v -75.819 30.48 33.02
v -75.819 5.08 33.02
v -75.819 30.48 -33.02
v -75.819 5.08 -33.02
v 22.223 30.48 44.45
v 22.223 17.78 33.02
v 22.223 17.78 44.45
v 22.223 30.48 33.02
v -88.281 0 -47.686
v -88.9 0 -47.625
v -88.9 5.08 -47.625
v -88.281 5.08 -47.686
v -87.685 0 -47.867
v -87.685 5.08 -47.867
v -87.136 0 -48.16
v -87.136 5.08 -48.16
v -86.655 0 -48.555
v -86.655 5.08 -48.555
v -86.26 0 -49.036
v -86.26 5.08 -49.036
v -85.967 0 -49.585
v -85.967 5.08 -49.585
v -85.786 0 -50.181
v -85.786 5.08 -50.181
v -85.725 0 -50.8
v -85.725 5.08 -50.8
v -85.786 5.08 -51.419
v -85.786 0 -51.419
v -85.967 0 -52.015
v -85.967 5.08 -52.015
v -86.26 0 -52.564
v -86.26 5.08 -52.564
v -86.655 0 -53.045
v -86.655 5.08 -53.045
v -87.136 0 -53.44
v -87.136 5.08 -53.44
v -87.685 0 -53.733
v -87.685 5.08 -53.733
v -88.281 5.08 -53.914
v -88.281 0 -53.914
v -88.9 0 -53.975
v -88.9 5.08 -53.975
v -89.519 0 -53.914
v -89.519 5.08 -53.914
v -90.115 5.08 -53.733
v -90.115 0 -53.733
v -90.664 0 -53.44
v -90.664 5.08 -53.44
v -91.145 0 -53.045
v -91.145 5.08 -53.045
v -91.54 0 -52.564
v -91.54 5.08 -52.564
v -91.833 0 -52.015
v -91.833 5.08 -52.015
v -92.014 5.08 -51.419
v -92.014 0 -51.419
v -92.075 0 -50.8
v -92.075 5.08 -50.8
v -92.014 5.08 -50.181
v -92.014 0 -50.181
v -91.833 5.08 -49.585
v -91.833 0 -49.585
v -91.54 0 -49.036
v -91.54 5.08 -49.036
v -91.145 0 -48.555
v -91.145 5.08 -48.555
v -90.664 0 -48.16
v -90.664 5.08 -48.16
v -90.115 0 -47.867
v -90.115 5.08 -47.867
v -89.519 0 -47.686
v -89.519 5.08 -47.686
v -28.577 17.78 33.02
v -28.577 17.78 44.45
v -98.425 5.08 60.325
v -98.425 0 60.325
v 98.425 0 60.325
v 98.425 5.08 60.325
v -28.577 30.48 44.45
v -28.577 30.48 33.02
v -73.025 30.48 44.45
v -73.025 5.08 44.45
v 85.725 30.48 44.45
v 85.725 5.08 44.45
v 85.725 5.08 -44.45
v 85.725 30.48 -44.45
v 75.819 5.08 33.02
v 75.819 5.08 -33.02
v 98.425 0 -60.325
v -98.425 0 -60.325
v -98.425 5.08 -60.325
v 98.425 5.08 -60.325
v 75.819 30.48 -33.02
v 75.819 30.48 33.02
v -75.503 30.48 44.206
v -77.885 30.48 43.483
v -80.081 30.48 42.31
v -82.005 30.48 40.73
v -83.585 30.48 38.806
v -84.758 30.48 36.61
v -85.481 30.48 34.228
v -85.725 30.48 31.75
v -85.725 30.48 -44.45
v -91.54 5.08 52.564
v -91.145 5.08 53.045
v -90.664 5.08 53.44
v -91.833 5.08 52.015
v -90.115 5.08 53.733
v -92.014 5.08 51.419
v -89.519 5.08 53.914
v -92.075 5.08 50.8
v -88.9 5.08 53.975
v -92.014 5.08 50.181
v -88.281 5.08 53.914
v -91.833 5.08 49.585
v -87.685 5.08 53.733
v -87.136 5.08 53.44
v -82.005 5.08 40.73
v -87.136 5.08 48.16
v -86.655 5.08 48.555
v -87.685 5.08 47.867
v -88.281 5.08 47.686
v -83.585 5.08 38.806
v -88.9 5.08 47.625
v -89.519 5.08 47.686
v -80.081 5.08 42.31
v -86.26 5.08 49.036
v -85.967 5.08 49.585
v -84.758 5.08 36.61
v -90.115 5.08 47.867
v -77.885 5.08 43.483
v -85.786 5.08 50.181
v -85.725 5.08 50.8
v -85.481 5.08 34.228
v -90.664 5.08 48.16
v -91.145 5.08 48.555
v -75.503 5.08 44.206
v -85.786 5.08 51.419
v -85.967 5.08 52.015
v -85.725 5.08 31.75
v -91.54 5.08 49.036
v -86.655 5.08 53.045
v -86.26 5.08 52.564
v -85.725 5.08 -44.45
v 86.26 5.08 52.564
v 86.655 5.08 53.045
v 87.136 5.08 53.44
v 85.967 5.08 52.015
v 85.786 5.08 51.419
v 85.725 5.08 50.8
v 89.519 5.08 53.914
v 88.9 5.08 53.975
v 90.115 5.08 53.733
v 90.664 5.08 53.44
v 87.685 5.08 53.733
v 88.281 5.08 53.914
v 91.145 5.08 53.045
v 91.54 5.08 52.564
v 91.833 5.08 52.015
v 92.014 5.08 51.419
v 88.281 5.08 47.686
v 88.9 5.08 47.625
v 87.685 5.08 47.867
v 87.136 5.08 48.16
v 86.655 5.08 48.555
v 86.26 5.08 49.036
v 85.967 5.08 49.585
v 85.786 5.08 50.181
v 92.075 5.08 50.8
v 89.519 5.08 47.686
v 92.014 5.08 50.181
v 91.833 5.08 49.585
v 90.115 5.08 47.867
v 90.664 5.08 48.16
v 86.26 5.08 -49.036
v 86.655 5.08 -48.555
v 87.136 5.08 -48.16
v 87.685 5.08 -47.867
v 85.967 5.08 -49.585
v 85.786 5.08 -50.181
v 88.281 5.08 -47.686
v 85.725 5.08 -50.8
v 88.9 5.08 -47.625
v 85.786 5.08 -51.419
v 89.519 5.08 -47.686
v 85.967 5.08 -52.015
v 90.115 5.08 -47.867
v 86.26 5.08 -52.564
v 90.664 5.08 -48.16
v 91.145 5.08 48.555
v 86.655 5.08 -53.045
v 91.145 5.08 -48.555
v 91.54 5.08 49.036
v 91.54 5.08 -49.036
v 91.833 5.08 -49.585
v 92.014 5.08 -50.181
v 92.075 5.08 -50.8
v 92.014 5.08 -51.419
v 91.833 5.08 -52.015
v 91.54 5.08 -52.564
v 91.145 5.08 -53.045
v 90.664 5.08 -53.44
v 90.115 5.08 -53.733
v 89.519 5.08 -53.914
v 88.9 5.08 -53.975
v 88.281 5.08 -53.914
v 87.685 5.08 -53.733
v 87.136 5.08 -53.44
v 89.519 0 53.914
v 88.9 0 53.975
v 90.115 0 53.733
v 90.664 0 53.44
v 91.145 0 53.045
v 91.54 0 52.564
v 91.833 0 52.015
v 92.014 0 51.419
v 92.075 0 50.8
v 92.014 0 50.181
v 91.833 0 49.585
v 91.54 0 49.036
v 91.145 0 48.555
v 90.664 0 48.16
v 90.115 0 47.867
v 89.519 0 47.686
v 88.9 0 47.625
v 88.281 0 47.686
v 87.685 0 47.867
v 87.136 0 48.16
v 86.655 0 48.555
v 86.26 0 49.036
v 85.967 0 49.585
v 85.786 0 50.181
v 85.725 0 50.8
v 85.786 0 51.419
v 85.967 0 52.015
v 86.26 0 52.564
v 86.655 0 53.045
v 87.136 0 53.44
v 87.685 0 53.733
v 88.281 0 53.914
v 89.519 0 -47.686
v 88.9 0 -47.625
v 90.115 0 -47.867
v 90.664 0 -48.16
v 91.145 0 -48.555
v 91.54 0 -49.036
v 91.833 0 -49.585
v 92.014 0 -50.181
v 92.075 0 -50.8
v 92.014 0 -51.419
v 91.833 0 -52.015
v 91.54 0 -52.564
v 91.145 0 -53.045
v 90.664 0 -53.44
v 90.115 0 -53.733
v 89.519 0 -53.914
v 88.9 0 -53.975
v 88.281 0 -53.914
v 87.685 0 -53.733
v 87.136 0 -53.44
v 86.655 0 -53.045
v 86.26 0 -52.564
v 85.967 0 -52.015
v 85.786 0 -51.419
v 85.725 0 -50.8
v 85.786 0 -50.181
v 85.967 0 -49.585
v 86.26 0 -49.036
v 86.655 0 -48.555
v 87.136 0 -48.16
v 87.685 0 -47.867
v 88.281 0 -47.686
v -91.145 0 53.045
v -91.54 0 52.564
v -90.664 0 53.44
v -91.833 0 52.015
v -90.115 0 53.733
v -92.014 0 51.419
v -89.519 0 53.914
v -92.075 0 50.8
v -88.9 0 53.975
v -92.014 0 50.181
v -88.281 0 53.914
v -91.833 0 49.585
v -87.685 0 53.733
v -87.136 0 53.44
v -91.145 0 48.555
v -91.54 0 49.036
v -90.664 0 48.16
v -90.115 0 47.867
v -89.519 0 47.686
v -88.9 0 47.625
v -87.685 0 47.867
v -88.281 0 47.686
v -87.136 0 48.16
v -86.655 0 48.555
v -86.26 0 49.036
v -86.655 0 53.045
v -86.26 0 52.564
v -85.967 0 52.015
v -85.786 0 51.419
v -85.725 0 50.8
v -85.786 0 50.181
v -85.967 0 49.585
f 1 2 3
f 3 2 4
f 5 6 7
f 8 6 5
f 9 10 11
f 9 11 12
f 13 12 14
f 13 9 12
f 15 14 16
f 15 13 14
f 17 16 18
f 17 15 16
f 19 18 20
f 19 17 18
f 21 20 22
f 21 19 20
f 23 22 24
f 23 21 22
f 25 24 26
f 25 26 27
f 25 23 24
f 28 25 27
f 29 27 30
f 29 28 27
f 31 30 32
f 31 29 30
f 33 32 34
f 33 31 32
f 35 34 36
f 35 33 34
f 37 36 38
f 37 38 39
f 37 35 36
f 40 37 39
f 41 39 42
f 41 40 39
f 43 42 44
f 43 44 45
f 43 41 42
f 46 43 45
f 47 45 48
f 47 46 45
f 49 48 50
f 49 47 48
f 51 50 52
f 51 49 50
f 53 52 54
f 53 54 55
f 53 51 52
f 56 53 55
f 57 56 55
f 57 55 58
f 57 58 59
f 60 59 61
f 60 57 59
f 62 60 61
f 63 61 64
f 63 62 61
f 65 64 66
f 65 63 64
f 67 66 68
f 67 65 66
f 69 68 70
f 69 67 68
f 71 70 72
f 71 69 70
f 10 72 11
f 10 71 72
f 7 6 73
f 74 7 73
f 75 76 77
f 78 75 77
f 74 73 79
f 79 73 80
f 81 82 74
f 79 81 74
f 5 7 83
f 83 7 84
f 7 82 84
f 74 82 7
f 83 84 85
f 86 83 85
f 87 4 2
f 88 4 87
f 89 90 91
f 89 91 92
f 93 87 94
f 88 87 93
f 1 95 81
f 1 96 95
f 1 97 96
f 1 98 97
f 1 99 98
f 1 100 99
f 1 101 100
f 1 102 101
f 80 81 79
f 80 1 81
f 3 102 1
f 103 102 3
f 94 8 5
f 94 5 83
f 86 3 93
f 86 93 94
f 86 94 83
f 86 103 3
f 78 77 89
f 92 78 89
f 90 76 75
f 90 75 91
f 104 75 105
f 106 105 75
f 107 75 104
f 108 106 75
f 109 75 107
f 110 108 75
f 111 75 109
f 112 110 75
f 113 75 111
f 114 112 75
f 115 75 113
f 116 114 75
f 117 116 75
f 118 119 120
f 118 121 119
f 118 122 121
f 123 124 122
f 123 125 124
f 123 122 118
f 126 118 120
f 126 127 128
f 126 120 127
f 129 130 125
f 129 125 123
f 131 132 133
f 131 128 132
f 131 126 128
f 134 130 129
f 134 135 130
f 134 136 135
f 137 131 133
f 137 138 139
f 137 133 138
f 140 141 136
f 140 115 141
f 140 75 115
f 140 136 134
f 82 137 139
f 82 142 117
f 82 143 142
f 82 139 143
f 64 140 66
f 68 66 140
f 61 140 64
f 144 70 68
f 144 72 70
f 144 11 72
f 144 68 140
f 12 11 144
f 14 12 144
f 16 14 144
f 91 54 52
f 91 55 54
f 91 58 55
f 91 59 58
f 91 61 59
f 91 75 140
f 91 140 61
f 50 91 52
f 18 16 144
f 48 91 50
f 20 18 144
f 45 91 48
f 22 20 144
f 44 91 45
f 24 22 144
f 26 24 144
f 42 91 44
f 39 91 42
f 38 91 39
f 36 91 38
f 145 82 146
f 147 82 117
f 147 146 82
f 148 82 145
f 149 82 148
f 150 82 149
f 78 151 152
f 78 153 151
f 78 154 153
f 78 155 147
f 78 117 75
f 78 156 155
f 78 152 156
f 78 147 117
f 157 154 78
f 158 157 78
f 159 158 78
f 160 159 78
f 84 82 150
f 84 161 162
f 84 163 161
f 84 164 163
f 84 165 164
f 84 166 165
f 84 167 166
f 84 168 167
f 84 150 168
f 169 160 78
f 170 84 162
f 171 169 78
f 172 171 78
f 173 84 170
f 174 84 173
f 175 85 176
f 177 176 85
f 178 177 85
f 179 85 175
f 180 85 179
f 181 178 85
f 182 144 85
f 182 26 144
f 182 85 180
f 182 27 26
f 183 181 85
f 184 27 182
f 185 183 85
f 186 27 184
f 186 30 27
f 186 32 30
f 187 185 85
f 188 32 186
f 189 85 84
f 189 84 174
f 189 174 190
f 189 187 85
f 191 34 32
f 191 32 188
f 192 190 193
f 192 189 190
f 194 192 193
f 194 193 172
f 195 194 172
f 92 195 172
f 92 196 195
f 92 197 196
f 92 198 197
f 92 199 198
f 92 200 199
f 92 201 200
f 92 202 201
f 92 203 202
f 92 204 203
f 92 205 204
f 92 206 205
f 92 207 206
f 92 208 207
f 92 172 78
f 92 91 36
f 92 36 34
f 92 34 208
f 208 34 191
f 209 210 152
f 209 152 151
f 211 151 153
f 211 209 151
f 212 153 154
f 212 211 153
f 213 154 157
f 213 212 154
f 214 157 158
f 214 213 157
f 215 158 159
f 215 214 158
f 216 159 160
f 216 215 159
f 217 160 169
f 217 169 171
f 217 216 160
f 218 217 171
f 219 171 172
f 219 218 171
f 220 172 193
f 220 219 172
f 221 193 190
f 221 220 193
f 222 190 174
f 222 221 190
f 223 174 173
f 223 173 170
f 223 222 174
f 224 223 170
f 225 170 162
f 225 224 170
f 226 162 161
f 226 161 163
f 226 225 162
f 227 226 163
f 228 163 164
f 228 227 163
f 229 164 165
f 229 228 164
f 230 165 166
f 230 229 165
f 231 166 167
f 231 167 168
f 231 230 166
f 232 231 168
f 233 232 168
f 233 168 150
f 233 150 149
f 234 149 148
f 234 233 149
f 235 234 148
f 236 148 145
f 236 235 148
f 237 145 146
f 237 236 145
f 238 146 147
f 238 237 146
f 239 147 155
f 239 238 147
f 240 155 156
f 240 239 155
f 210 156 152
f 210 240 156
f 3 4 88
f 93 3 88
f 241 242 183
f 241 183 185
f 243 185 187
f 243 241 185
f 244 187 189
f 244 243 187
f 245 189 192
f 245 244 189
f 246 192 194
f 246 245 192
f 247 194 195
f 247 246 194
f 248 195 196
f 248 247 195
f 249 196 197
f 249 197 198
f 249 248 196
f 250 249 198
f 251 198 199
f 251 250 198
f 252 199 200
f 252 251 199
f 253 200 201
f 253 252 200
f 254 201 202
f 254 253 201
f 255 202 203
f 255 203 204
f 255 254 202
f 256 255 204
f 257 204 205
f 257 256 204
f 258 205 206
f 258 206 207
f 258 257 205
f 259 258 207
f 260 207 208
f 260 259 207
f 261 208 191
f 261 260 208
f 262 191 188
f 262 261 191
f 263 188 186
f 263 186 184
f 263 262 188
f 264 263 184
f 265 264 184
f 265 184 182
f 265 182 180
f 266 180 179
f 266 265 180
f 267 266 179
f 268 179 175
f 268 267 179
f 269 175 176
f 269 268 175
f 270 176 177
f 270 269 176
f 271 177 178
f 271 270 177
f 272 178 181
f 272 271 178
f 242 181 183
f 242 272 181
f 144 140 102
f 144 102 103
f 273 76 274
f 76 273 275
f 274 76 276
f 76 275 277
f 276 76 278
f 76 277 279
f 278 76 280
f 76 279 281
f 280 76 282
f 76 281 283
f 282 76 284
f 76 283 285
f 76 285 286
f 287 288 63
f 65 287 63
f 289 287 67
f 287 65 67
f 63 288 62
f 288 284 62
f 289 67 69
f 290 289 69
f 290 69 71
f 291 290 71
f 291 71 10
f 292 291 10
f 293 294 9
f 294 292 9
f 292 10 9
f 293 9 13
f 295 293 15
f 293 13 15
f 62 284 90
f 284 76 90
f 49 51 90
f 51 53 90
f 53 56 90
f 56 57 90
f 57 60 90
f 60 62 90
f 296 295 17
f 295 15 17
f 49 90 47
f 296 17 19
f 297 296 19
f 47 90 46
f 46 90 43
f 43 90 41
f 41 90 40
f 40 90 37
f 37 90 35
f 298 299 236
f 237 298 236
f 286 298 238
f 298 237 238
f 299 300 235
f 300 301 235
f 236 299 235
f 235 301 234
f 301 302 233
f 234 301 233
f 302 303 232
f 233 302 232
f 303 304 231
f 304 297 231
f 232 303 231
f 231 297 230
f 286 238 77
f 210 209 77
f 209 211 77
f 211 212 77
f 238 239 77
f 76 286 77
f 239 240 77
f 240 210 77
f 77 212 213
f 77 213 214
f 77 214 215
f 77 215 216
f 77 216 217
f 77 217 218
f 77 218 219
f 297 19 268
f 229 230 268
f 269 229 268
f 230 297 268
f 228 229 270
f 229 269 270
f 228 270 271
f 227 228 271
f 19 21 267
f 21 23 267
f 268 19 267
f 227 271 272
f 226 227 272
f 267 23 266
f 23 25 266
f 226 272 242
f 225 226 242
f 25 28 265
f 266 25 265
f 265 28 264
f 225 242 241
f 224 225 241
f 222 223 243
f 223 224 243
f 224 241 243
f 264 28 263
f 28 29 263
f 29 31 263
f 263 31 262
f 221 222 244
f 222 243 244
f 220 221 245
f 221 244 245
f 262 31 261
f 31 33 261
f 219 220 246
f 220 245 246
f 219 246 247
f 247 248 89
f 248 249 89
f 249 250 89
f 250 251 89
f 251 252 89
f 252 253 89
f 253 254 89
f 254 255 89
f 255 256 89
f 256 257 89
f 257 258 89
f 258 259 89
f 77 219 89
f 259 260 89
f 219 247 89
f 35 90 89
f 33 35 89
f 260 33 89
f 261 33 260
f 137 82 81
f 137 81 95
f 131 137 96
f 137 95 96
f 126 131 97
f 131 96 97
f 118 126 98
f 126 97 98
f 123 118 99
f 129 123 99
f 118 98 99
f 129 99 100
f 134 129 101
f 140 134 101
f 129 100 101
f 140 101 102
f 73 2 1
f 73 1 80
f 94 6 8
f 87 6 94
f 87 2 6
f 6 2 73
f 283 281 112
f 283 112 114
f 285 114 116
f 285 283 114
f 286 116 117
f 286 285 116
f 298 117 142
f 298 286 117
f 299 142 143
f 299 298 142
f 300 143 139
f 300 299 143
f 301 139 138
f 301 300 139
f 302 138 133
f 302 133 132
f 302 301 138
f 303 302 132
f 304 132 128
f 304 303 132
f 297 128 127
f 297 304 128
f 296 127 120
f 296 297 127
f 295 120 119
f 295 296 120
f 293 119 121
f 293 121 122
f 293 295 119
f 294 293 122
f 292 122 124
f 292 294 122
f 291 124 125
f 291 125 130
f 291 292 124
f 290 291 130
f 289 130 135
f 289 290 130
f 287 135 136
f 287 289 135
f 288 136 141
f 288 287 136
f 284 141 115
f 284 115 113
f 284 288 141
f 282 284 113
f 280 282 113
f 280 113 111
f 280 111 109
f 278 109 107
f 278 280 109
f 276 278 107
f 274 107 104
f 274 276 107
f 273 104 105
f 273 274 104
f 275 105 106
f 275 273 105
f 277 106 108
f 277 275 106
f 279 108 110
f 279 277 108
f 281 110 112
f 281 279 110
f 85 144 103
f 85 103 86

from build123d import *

# Parameters (mm, degrees)
SKETCH1_W           = 196.85
SKETCH1_H           = 120.65
SKETCH1_R           = 3.175
BOSS_EXTRUDE2_DEPTH = 5.08
SKETCH4_W           = 171.45
SKETCH4_H           = 88.9
SKETCH4_W_2         = 151.638
SKETCH4_H_2         = 66.04
BOSS_EXTRUDE3_DEPTH = 25.4
FILLET4_R           = 12.7
CUT_EXTRUDE1_REACH  = 141.032
SKETCH7_W           = 50.8
SKETCH7_H           = 12.7


with BuildPart() as part:
    # Sketch1 → Boss-Extrude2 (new body)
    with BuildSketch(Plane(origin=(0, 0, 0), x_dir=(1, 0, 0), z_dir=(0, 1, 0))):
        Rectangle(SKETCH1_W, SKETCH1_H)
        with Locations(Location((-88.9, -50.8, 0), (0, 0, 270))):
            Circle(SKETCH1_R, mode=Mode.SUBTRACT)
        with Locations(Location((88.9, -50.8, 0), (0, 0, 270))):
            Circle(SKETCH1_R, mode=Mode.SUBTRACT)
        with Locations(Location((-88.9, 50.8, 0), (0, 0, 270))):
            Circle(SKETCH1_R, mode=Mode.SUBTRACT)
        with Locations(Location((88.9, 50.8, 0), (0, 0, 270))):
            Circle(SKETCH1_R, mode=Mode.SUBTRACT)
    extrude(amount=BOSS_EXTRUDE2_DEPTH)

    # Sketch4 → Boss-Extrude3 (add)
    with BuildSketch(Plane(origin=(0, 5.08, 0), x_dir=(1, 0, 0), z_dir=(0, 1, 0))):
        Rectangle(SKETCH4_W, SKETCH4_H)
        Rectangle(SKETCH4_W_2, SKETCH4_H_2, mode=Mode.SUBTRACT)
    extrude(amount=BOSS_EXTRUDE3_DEPTH)

    # Fillet4
    fillet4_edges = [part.edges().sort_by_distance(p)[0] for p in [
        (-85.725, 17.78, 44.45),
    ]]
    fillet(fillet4_edges, radius=FILLET4_R)

    # Sketch7 → Cut-Extrude1 (cut, up to next)
    with BuildSketch(Plane(origin=(0, 0, 33.02), x_dir=(-1, 0, 0), z_dir=(0, 0, -1)), mode=Mode.PRIVATE) as cut_extrude1_sk1:
        with Locations((3.176986547, 24.13)):
            Rectangle(SKETCH7_W, SKETCH7_H)
    cut_extrude1_tool1 = extrude(cut_extrude1_sk1.sketch, amount=-CUT_EXTRUDE1_REACH, mode=Mode.PRIVATE) & part.part
    add(cut_extrude1_tool1.solids().sort_by_distance((-3.176987, 24.13, 33.02))[0], mode=Mode.SUBTRACT)


solid = part.part
